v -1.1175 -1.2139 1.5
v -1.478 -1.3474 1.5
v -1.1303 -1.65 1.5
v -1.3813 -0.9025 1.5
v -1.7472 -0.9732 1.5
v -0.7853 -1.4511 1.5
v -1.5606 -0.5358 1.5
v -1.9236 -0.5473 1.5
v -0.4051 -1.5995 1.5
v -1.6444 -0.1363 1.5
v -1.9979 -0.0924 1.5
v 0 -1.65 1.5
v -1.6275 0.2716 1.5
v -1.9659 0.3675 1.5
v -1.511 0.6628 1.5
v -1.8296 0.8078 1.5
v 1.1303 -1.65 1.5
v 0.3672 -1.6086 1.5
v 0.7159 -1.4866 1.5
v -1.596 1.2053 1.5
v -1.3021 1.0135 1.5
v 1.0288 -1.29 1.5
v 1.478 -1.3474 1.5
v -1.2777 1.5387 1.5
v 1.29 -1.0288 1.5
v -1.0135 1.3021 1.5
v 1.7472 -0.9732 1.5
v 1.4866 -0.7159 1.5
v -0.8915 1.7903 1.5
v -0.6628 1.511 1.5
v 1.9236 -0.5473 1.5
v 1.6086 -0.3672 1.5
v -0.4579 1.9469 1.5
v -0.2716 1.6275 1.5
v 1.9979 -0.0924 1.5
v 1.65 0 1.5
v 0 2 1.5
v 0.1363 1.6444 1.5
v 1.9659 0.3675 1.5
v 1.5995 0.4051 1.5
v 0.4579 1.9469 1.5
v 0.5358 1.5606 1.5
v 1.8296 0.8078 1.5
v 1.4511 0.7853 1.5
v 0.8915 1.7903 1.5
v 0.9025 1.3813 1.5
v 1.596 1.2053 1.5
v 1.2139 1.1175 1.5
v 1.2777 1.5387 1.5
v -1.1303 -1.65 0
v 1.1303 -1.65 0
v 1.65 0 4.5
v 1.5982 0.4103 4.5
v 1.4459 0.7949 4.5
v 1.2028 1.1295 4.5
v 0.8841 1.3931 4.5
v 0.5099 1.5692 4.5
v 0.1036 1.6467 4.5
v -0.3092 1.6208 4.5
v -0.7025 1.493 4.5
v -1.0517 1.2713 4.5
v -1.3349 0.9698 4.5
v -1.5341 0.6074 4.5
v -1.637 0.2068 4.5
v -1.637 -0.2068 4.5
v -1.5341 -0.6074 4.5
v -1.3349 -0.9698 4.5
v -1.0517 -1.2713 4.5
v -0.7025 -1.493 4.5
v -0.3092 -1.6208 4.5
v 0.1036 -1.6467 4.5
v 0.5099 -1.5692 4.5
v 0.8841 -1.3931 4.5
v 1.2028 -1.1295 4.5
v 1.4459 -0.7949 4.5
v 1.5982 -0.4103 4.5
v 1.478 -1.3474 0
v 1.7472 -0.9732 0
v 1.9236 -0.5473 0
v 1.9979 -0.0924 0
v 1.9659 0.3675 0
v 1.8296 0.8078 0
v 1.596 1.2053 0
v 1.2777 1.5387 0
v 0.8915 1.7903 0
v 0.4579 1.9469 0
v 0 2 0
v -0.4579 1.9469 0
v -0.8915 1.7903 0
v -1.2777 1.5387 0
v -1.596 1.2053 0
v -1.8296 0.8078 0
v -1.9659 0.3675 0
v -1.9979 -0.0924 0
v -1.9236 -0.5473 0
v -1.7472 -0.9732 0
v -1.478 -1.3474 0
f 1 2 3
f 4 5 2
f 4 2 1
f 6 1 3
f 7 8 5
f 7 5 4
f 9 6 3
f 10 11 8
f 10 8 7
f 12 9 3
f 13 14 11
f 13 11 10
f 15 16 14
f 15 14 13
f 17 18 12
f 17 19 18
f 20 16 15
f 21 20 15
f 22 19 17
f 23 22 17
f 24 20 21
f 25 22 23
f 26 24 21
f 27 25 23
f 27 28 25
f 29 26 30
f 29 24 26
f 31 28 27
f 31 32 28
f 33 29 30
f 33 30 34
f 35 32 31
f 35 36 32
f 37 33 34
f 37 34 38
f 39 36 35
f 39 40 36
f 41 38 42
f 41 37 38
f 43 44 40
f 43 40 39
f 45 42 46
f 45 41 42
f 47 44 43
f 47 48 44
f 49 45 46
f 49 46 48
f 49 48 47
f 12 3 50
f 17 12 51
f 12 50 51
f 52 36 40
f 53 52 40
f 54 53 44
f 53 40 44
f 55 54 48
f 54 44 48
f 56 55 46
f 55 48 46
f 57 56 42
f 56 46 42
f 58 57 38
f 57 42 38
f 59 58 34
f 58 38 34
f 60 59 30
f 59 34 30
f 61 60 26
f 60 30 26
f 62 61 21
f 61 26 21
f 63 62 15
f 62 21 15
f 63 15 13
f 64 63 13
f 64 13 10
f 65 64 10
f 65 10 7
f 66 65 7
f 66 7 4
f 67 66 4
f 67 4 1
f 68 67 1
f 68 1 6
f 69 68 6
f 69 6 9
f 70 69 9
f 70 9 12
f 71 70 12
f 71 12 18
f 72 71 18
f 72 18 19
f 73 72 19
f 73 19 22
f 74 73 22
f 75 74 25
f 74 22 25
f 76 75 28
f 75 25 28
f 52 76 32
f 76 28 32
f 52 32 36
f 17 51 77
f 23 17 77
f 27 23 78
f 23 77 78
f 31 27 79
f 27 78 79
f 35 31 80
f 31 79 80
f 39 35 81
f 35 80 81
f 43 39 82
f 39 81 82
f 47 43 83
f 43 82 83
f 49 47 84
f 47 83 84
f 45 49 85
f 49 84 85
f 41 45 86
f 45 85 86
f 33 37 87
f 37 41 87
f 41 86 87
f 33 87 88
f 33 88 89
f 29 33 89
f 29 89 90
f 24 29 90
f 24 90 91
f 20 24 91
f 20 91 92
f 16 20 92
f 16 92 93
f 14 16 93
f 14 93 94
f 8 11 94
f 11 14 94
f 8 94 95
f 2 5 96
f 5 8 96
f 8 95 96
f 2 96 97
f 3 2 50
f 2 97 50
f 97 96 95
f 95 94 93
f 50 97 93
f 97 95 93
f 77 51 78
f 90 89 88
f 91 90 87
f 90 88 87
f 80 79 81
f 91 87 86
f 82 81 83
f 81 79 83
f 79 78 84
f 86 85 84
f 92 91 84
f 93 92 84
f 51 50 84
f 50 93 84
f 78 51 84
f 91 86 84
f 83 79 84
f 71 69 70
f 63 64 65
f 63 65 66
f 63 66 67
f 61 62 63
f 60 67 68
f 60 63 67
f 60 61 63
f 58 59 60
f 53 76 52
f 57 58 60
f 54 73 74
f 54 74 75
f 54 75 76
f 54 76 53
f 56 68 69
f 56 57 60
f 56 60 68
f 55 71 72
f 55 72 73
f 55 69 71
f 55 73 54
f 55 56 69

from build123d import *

# Parameters (mm, degrees)
SKETCH1_R           = 2
BOSS_EXTRUDE1_DEPTH = 1.5
SKETCH2_R           = 1.65
BOSS_EXTRUDE2_DEPTH = 3
CUT_EXTRUDE1_START  = -1.5
CUT_EXTRUDE1_DEPTH  = 1.5


with BuildPart() as part:
    # Sketch1 → Boss-Extrude1 (new body)
    with BuildSketch(Plane.XY):
        Circle(SKETCH1_R)
    extrude(amount=BOSS_EXTRUDE1_DEPTH)

    # Sketch2 → Boss-Extrude2 (add)
    with BuildSketch(Plane.XY.offset(1.5)):
        Circle(SKETCH2_R)
    extrude(amount=BOSS_EXTRUDE2_DEPTH)

    # Sketch3 → Cut-Extrude1 (cut)
    with BuildSketch(Plane.XY.offset(1.5).offset(CUT_EXTRUDE1_START)):
        with BuildLine():
            Line((-1.130265456, -1.65), (1.130265456, -1.65))
            ThreePointArc((1.130265456, -1.65), (0, -2), (-1.130265456, -1.65))
        make_face()
    extrude(amount=CUT_EXTRUDE1_DEPTH, mode=Mode.SUBTRACT)


solid = part.part
